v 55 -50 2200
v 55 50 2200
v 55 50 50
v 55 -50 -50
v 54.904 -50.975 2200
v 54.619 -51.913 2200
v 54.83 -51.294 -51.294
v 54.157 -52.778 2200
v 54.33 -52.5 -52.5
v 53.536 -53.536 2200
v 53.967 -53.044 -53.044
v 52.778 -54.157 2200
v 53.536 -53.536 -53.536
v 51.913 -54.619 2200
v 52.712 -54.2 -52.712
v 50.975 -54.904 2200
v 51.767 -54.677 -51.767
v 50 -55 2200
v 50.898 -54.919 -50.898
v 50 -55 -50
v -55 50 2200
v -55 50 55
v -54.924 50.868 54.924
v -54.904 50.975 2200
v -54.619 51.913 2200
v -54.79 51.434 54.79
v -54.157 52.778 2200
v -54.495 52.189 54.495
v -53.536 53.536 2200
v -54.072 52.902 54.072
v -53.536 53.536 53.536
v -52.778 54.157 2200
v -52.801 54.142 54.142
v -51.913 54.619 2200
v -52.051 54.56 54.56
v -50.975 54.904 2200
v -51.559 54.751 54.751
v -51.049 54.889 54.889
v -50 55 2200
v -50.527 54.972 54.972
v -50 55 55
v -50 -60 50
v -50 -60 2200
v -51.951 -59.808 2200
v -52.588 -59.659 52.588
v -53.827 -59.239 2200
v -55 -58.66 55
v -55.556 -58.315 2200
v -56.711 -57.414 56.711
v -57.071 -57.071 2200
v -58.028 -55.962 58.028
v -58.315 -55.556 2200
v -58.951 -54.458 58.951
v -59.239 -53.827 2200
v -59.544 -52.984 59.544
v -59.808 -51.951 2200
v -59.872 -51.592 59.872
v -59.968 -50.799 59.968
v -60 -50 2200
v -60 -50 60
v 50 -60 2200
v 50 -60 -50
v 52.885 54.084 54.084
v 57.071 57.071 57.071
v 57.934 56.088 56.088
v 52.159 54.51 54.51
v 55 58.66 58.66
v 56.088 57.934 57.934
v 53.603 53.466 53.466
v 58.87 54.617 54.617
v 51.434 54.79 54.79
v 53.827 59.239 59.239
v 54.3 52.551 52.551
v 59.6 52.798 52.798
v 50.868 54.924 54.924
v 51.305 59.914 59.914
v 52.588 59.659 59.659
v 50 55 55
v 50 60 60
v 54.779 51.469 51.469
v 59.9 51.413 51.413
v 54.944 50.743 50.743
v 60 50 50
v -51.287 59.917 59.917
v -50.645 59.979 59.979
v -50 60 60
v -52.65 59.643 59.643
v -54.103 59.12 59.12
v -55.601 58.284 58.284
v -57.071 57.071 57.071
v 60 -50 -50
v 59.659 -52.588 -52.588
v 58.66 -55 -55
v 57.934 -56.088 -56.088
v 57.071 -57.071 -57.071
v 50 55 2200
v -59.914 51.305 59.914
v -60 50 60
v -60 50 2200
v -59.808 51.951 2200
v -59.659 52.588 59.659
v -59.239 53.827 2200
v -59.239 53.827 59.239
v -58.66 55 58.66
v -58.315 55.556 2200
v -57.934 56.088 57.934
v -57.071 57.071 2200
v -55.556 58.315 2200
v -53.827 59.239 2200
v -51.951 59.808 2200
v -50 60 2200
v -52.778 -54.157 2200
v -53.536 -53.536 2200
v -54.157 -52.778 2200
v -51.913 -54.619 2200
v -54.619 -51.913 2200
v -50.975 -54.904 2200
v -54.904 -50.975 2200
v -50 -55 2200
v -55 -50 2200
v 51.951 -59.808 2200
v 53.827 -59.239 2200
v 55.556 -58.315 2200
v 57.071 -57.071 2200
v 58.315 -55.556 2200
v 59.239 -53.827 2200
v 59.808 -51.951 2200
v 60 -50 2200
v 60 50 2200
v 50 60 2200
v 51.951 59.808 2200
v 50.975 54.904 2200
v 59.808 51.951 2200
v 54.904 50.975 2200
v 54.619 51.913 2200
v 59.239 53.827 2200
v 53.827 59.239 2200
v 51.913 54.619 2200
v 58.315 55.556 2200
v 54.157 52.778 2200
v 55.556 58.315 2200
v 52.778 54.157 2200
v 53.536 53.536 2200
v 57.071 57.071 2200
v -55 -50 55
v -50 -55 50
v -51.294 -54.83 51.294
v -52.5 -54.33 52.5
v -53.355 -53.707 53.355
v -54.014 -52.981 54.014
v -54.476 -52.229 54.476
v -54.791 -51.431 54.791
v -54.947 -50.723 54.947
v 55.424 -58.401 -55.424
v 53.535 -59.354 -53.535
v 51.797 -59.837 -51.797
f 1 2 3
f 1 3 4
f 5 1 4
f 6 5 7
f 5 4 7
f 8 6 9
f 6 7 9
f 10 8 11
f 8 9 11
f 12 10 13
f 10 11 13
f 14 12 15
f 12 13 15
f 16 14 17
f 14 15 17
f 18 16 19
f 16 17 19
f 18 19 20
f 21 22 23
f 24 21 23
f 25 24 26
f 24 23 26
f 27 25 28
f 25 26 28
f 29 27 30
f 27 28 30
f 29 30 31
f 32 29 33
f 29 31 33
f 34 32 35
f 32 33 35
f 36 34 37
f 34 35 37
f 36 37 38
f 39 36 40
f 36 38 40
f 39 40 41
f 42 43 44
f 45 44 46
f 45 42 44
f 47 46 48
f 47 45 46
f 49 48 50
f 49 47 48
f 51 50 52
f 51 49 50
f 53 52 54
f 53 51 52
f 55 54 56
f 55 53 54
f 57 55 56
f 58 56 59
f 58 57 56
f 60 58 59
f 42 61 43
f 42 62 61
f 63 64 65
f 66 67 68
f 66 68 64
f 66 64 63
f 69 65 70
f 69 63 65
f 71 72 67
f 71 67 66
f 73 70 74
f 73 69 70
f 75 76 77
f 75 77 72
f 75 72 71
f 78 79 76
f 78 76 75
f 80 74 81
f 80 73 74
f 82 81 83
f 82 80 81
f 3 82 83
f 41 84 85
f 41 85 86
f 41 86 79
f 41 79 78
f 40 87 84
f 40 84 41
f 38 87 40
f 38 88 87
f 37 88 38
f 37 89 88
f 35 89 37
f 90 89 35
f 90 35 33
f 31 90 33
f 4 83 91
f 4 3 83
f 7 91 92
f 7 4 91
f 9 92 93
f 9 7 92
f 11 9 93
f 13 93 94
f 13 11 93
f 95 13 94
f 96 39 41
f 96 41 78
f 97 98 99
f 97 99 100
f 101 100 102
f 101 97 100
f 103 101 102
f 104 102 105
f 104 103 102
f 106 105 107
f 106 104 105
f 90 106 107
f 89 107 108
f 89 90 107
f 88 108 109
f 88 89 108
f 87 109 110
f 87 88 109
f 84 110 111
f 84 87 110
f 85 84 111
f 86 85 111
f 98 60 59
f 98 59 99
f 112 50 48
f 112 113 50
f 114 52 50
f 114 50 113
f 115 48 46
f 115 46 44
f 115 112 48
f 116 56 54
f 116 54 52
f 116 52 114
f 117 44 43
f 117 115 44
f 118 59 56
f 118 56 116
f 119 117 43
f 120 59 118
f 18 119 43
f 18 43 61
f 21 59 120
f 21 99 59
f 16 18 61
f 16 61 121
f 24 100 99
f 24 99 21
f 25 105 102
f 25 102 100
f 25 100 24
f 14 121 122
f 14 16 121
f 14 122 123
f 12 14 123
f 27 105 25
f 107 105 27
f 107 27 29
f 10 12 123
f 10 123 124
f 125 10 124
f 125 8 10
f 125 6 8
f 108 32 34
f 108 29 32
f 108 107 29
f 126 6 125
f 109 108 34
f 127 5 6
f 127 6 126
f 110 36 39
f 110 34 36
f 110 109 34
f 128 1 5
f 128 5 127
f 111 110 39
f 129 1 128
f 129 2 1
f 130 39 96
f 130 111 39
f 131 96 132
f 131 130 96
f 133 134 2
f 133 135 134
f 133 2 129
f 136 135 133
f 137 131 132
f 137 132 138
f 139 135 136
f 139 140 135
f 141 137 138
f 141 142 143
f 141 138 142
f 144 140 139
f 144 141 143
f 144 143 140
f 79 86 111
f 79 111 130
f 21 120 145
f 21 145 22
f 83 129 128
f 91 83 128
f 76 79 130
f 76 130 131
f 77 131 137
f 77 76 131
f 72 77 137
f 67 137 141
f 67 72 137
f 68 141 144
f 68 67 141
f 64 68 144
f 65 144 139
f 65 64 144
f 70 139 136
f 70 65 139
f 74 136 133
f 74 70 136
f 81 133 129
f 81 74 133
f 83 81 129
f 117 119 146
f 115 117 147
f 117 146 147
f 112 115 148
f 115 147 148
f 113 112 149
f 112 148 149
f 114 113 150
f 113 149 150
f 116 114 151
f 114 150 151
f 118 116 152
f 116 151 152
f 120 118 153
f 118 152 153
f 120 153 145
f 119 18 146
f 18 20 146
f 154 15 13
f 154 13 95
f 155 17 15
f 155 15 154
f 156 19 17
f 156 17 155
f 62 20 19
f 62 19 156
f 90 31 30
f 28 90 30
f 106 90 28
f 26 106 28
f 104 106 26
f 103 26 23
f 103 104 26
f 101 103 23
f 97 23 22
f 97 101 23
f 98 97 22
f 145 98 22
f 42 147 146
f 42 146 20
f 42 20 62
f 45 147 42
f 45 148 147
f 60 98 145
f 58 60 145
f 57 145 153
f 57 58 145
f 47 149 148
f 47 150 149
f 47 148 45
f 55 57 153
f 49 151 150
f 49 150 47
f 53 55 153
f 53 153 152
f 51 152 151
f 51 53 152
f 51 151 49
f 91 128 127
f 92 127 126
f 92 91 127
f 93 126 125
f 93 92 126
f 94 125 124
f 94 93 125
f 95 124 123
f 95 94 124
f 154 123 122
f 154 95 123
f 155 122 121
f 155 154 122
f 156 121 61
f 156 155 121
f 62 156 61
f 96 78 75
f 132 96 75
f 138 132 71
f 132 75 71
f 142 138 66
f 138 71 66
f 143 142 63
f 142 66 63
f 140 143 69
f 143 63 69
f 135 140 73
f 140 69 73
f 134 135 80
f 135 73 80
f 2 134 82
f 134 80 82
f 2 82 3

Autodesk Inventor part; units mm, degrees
ref_plane "Start Plane" through (0, 0, -57.0711) normal (0, 0, 1) x (1, 0, 0)
ref_plane "End Plane" through (0, 0, 2200) normal (0, 0, 1) x (1, 0, 0)
sketch "Sketch" plane through (0, 0, 0) normal (0, 0, 1) x (1, 0, 0)
  line L0 (-60, -50) -> (-60, 50)
  line L1 (-50, 60) -> (50, 60)
  line L2 (60, 50) -> (60, -50)
  line L3 (50, -60) -> (-50, -60)
  arc A0 (-60, -50) -> (-50, -60) centre (-50, -50) ccw
  arc A1 (60, 50) -> (50, 60) centre (50, 50) ccw
  arc A2 (-50, 60) -> (-60, 50) centre (-50, 50) ccw
  arc A3 (50, -60) -> (60, -50) centre (50, -50) ccw
  arc A4 (-50, 55) -> (-55, 50) centre (-50, 50) ccw
  line L4 (-50, 55) -> (50, 55)
  arc A5 (55, 50) -> (50, 55) centre (50, 50) ccw
  line L5 (55, 50) -> (55, -50)
  arc A6 (50, -55) -> (55, -50) centre (50, -50) ccw
  line L6 (50, -55) -> (-50, -55)
  arc A7 (-55, -50) -> (-50, -55) centre (-50, -50) ccw
  line L7 (-55, -50) -> (-55, 50)
  line L8 (0, 86.8995) -> (0, -86.8995) construction
  line L9 (-86.8995, 0) -> (86.8995, 0) construction
  dimension "d7" = 10
  dimension "d9" = 120
  dimension "d11" = 120
  dimension "d12" = 5
  dimension "d15" = 60
  dimension "d16" = 60
extrude "Body" add sketch "Sketch" along normal up to surface (2257.0711 mm away) from surface at -57.0711
sketch "Sketch3" plane through (0, 0, 0) normal (0, 0, 1) x (1, 0, 0)
  line L0 (0, 0) -> (10, 0)
ref_plane "Work Plane3" through (0, 0, 0) normal (0, -1, 0) x (1, 0, 0)
ref_plane "Work Plane4" through (60, 0, -60) normal (-0.7071, 0, -0.7071) x (-0.7071, 0, 0.7071)
split "Split1" plane through (60, 0, -60) removes the side toward (-0.7071, 0, -0.7071)
ref_plane "Work Plane5" through (0, -60, -60) normal (0, 0.7071, -0.7071) x (1, 0, 0)
split "Split2" plane through (0, -60, -60) removes the side toward (0, 0.7071, -0.7071)
sketch "Sketch4" plane through (0, 0, 0) normal (0, -1, 0) x (1, 0, 0)
  line L0 (-2, -57.0711) -> (12, -57.0711) projected
  line L1 (-2, 2200) -> (12, 2200) projected
  dimension "d18" = 2257.0711
equation "\"d7\" = G_IR"
equation "\"d9\" = G_W"
equation "\"d11\" = G_H"
equation "\"d12\" = G_T"
equation "\"d15\" = 0.5 * d9"
equation "\"d16\" = 0.5 * d11"
equation "\"d3\" = G_L"
equation "\"G_W\" = 120"
equation "\"G_H\" = 120"
equation "\"G_T\" = 5"
equation "\"G_IR\" = 10"
equation "\"G_L\" = d18"
equation "\"G_OFFSET_START\" = 57.07107"
equation "\"G_OFFSET_END\" = 0"
equation "\"d13\" = -G_OFFSET_START"
properties part number "ISO 10799-2 - 120x120x5 - 2257,07" material "Steel, Mild"
